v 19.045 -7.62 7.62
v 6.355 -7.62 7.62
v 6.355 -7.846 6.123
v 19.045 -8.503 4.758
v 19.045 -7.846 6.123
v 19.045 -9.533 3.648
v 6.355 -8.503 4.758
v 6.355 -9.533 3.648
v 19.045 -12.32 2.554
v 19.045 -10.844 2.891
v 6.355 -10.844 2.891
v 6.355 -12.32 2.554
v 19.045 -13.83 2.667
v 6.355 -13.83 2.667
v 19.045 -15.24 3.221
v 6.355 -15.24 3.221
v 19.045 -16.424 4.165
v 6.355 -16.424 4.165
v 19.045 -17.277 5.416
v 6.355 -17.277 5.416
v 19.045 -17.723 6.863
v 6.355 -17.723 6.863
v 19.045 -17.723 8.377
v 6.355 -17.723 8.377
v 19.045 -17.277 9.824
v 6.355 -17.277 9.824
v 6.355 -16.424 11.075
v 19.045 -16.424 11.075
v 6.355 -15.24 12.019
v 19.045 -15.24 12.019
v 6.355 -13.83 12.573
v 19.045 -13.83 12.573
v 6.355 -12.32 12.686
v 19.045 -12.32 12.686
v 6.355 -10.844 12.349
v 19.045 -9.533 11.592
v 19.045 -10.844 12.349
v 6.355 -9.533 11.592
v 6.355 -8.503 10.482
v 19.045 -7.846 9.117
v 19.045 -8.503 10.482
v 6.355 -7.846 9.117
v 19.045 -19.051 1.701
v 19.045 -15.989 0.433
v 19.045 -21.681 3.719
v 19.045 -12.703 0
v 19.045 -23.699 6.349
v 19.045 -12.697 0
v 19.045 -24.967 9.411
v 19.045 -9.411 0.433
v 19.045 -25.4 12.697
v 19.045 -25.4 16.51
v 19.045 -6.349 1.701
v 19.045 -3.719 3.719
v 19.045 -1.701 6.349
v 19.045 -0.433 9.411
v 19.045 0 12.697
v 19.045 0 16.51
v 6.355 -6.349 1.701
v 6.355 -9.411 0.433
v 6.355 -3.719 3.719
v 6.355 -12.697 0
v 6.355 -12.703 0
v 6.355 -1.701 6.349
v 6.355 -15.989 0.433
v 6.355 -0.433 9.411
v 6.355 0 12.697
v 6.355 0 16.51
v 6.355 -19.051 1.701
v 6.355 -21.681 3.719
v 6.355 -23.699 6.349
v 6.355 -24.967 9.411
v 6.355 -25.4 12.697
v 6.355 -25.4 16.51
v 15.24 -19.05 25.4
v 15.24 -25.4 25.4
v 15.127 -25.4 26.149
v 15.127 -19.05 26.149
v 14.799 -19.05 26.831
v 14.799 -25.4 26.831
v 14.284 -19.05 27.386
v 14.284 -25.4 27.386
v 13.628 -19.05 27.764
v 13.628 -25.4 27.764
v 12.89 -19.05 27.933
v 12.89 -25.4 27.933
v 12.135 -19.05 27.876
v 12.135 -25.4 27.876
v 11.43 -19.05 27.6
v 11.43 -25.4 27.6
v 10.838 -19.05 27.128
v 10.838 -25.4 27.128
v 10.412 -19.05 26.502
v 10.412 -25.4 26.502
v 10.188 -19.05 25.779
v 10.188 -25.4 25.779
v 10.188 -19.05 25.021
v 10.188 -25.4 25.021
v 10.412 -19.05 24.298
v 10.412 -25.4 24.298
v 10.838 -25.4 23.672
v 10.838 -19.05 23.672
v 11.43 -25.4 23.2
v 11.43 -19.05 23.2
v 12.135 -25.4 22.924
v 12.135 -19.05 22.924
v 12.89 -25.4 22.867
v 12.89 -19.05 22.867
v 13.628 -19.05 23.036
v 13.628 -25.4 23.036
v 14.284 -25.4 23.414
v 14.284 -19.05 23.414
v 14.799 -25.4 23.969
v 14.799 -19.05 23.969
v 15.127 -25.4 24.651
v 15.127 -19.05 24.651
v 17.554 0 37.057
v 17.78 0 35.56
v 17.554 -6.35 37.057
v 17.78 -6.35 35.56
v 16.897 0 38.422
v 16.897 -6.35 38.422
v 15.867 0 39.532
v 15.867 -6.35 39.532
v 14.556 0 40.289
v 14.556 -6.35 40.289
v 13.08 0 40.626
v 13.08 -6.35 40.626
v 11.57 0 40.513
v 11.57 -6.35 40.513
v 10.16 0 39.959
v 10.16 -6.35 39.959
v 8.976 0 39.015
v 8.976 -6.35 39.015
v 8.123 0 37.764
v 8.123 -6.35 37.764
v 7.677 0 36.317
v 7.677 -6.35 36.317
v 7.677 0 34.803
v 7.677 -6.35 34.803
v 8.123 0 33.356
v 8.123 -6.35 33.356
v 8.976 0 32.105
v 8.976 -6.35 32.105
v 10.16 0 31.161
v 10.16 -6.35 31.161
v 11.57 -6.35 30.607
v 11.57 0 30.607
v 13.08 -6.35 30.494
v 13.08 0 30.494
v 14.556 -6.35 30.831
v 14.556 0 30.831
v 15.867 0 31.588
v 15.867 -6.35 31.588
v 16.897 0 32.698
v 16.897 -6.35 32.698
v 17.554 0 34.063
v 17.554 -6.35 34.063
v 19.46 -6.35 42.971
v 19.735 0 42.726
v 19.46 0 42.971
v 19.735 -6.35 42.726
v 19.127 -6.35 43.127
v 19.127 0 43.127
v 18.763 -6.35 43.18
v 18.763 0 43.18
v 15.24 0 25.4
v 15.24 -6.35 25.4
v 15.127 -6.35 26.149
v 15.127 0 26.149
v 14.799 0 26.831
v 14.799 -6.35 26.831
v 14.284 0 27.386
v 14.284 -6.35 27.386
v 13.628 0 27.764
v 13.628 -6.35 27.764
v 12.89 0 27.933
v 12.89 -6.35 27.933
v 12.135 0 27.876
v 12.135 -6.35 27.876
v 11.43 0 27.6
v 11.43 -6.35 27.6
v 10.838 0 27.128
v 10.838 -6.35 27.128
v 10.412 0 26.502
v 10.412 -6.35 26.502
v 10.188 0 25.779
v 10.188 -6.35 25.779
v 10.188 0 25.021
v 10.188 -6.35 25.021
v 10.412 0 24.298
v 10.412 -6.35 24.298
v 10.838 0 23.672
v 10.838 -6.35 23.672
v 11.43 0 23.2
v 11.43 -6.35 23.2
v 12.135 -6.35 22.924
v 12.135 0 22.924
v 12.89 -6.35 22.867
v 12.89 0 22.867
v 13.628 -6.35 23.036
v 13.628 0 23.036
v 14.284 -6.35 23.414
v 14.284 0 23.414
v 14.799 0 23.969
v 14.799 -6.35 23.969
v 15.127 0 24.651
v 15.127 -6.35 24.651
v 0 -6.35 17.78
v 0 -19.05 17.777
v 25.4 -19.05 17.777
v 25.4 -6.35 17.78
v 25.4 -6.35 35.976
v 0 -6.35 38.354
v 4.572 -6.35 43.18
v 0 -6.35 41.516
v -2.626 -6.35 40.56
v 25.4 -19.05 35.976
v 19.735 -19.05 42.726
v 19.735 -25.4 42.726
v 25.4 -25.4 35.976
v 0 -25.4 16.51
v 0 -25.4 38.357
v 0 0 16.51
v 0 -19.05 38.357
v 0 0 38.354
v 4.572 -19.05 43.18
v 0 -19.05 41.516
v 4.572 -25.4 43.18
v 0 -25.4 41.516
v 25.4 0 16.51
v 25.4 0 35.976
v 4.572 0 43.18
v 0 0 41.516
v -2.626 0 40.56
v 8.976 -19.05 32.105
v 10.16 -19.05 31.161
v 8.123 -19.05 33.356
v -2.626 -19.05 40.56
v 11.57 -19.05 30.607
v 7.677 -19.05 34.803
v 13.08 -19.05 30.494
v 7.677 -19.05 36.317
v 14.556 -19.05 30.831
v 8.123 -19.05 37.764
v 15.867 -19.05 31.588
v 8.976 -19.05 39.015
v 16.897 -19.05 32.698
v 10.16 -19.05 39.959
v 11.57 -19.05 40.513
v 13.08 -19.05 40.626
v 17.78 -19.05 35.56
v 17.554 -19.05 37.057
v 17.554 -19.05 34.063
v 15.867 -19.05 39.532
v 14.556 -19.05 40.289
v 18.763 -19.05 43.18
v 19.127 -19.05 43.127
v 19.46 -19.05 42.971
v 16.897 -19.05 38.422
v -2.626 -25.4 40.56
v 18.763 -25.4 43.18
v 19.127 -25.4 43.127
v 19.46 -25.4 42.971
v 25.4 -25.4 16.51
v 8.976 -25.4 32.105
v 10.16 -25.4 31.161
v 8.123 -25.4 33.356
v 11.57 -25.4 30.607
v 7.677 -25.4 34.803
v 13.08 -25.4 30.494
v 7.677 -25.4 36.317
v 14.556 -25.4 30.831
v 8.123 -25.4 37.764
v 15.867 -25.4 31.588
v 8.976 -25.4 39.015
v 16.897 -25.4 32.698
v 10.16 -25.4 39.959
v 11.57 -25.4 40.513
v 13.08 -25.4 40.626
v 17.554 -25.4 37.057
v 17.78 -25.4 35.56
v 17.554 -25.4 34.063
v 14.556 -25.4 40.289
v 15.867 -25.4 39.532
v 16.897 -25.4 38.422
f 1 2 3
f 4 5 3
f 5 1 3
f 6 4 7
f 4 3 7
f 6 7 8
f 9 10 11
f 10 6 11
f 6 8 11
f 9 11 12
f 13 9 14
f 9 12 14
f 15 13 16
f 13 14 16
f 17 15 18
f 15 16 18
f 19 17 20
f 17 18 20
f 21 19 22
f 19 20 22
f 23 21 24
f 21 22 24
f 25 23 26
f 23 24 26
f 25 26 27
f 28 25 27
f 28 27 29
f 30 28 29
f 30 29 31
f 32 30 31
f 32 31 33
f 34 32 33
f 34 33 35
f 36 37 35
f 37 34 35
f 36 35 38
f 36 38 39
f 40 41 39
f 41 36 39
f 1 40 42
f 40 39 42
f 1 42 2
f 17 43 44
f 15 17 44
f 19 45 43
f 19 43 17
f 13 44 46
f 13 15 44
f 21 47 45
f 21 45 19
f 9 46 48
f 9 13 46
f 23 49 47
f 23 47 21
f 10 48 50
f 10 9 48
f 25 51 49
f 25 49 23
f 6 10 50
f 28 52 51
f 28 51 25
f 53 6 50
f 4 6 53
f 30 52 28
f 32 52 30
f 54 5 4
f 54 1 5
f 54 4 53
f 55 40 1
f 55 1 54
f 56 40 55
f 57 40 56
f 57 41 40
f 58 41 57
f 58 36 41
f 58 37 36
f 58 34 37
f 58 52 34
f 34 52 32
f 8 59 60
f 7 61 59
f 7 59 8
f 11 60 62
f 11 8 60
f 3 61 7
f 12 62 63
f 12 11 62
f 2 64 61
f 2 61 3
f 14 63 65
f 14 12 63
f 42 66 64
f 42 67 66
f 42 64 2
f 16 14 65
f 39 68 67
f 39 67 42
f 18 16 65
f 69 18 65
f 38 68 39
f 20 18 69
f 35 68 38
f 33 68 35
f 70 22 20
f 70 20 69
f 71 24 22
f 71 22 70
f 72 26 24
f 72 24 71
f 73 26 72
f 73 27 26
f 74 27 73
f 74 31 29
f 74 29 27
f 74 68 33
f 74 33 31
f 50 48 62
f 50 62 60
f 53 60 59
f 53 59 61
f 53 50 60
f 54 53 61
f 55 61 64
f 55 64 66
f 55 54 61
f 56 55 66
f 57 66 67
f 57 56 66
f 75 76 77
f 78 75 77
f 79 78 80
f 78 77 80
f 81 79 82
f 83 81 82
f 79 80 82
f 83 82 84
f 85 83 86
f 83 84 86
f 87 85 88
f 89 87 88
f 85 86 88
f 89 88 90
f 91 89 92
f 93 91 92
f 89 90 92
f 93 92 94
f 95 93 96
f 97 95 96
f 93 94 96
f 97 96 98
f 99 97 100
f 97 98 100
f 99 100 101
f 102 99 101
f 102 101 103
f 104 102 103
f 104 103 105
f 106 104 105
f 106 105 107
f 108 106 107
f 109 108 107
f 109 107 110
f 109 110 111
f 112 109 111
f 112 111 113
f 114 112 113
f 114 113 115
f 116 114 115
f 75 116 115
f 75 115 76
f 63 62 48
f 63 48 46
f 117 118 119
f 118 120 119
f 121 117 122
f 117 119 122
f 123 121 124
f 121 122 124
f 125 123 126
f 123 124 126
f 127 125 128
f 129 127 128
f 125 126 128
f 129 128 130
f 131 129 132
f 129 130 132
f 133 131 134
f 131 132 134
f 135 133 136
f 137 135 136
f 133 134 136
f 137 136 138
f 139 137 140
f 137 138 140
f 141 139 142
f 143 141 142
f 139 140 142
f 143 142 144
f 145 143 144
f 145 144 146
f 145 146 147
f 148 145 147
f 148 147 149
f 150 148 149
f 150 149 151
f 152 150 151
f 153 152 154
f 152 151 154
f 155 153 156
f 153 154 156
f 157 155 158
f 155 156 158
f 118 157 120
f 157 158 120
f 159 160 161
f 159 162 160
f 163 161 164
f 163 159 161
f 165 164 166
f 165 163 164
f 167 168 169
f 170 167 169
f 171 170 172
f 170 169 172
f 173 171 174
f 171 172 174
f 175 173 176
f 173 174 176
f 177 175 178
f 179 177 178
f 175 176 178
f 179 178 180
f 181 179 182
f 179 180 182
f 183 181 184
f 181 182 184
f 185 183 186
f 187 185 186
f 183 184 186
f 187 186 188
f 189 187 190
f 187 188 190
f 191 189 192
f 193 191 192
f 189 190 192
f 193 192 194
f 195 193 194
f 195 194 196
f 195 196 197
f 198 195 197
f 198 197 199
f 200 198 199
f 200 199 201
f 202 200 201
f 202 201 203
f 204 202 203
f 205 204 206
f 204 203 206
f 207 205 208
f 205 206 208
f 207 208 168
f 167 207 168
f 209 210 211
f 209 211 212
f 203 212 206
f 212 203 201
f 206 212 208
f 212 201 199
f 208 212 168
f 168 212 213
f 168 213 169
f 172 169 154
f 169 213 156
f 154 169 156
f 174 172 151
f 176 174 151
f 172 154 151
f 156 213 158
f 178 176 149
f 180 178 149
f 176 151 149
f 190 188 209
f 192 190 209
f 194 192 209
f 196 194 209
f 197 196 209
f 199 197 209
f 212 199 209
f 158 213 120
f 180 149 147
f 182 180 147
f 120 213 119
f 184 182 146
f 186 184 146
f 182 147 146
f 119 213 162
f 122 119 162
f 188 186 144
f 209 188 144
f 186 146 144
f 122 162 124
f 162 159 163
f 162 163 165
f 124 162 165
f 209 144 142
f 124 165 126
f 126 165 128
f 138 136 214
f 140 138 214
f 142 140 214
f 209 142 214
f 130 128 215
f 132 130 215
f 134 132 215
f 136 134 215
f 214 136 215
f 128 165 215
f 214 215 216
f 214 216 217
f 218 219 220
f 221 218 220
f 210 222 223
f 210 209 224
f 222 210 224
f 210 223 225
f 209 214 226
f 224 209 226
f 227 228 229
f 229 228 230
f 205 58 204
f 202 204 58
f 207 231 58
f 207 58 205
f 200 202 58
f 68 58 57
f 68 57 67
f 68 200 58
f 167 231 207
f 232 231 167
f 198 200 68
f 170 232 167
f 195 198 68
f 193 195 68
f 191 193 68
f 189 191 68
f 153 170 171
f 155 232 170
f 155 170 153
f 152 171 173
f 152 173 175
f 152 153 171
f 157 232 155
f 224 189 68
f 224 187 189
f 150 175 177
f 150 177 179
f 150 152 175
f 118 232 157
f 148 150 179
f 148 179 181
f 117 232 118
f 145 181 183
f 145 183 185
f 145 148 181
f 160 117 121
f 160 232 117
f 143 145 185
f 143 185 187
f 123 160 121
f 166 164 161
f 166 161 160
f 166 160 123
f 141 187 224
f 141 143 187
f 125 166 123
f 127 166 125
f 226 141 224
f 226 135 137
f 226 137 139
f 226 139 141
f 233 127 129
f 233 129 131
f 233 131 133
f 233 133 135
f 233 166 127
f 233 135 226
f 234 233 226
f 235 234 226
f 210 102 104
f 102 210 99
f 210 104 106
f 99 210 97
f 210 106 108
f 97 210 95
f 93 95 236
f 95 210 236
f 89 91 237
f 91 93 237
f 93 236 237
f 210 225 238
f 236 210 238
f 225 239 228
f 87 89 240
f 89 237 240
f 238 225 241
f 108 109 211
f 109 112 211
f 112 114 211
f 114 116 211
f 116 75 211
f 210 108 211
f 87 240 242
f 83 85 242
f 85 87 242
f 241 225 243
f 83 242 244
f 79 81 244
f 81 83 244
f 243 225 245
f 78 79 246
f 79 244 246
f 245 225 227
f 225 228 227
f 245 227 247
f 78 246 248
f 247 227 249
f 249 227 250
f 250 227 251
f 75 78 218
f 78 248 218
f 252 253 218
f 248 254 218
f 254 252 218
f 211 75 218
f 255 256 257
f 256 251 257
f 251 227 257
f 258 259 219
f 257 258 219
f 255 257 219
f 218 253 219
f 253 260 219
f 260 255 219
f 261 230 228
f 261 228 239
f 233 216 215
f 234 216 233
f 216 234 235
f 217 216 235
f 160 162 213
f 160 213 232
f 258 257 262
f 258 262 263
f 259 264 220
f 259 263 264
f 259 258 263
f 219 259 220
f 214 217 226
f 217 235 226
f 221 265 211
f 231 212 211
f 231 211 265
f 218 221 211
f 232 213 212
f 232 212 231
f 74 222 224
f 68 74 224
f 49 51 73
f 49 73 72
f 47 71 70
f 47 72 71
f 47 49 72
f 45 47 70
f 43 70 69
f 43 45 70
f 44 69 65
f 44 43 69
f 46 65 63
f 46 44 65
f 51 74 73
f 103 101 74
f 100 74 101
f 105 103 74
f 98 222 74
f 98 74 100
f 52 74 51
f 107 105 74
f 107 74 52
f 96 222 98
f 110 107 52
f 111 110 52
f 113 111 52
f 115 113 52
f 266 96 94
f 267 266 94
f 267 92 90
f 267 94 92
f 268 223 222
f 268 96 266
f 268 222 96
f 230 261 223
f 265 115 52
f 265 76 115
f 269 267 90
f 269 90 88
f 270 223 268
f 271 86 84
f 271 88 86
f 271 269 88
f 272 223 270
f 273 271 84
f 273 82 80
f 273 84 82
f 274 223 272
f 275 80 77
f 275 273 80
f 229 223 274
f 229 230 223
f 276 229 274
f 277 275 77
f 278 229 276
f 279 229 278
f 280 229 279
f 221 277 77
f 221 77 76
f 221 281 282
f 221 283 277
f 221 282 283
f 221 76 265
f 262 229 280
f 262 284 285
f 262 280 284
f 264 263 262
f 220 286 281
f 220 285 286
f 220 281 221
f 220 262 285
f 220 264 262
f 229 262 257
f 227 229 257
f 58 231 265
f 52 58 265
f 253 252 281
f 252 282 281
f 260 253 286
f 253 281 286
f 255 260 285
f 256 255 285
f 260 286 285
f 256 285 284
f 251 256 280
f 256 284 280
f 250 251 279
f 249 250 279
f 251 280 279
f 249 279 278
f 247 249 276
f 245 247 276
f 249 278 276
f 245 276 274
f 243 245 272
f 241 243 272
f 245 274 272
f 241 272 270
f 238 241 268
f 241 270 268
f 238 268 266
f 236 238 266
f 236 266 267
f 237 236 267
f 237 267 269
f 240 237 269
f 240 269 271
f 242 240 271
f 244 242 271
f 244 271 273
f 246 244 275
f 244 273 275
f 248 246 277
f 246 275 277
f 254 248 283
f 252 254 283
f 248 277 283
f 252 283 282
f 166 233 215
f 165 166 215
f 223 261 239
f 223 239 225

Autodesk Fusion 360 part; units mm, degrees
sketch "Sketch1" plane through (0, 0, 0) normal (1, 0, 0) x (0, 1, 0)
  line L0 (0, 0) -> (-25.4, 0)
  line L1 (-25.4, 0) -> (-25.4, 43.18)
  line L2 (-25.4, 43.18) -> (-19.05, 43.18)
  line L3 (0, 0) -> (0, 43.18)
  line L4 (0, 43.18) -> (-6.35, 43.18)
  line L5 (-6.35, 43.18) -> (-6.35, 17.78)
  line L6 (-19.05, 43.18) -> (-19.05, 17.7768)
  line L7 (-19.05, 17.7768) -> (-6.35, 17.78)
  circle A0 centre (-12.7, 7.62) radius 5.08
  dimension "d1" = 25.4
  dimension "d2" = 43.18
  dimension "d3" = 6.35
  dimension "d5" = 25.4
  dimension "d6" = 10.16
  dimension "d7" = 12.7
  dimension "d8" = 7.62
  dimension "d10" = 6.35
  dimension "d11" = 12.7
  dimension "d12" = 43.18
extrude "Extrude1" add sketch "Sketch1" along normal blind 25.4
sketch "Sketch2" plane through (25.4, 0, 0) normal (1, 0, 0) x (0, 1, 0)
  circle A0 centre (-12.7, 7.62) radius 5.08
  line L0 (0, 0) -> (0, 43.18)
  line L1 (0, 43.18) -> (-6.35, 43.18)
  line L2 (-6.35, 43.18) -> (-6.35, 17.78)
  line L3 (-6.35, 17.78) -> (-19.05, 17.7768)
  line L4 (-19.05, 17.7768) -> (-19.05, 43.18)
  line L5 (-19.05, 43.18) -> (-25.4, 43.18)
  line L6 (-25.4, 43.18) -> (-25.4, 0)
  line L7 (-25.4, 0) -> (0, 0)
  line L8 (-25.4, 0) -> (0, 0)
  line L9 (0, 0) -> (0, 16.51)
  line L10 (0, 16.51) -> (-25.4, 16.51)
  line L11 (-25.4, 16.51) -> (-25.4, 0)
  dimension "d28" = 16.51
extrude "Extrude2" cut sketch "Sketch2" against normal blind 6.3551 contours L0 L6 L7 L8 L9 L10 L11
sketch "Sketch3" plane through (0, 0, 0) normal (-1, 0, 0) x (0, -1, 0)
  circle A0 centre (12.7, 7.62) radius 5.08
  line L0 (0, 43.18) -> (0, 0)
  line L1 (0, 0) -> (25.4, 0)
  line L2 (25.4, 0) -> (25.4, 43.18)
  line L3 (25.4, 43.18) -> (19.05, 43.18)
  line L4 (19.05, 43.18) -> (19.05, 17.7768)
  line L5 (19.05, 17.7768) -> (6.35, 17.78)
  line L6 (6.35, 17.78) -> (6.35, 43.18)
  line L7 (6.35, 43.18) -> (0, 43.18)
  line L8 (0, 0) -> (25.4, 0)
  line L9 (25.4, 0) -> (25.4, 16.51)
  line L10 (25.4, 16.51) -> (0, 16.51)
  line L11 (0, 16.51) -> (0, 0)
  dimension "d29" = 16.51
extrude "Extrude3" cut sketch "Sketch3" against normal blind 6.3551 contours L0 L1 L2 L8 L9 L10 L11
sketch "Sketch4" plane through (0, -25.4, 0) normal (0, -1, 0) x (1, 0, 0)
  line L0 (6.3551, 16.51) -> (6.3551, 0)
  line L1 (6.3551, 0) -> (19.0449, 0)
  line L2 (19.0449, 0) -> (19.0449, 16.51)
  line L3 (19.0449, 16.51) -> (25.4, 16.51)
  line L4 (25.4, 16.51) -> (25.4, 43.18)
  line L5 (25.4, 43.18) -> (0, 43.18)
  line L6 (0, 43.18) -> (0, 16.51)
  line L7 (0, 16.51) -> (6.3551, 16.51)
  line L8 (0, 43.18) -> (25.4422, 43.18)
  line L9 (25.4422, 43.18) -> (25.4422, 17.78)
  line L10 (25.4422, 17.78) -> (0, 17.78)
  line L11 (0, 17.78) -> (0, 43.18)
  circle A0 centre (12.7, 25.4) radius 2.54
  circle A1 centre (12.7, 35.56) radius 5.08
  dimension "d19" = 25.4
  dimension "d20" = 5.08
  dimension "d22" = 12.7
  dimension "d23" = 10.16
  dimension "d24" = 7.62
  dimension "d25" = 12.7
  dimension "d47" = 10.16
extrude "Extrude4" cut sketch "Sketch4" against normal blind 40.64 contours A0 | A1
fillet "Fillet1" radius 12.7 2 edges at (12.7, -25.4, 0) (12.7, 0, 0)
chamfer "Chamfer1" distance 6.0452 angle 50 2 edges at (25.4, -22.225, 43.18) (25.4, -3.175, 43.18) measured on face at (8.4667, -23.2833, 43.18) measured on face at (8.4667, -2.1167, 43.18)
chamfer "Chamfer2" distance 4.572 angle 20 1 edges at (0, -3.175, 43.18) measured on face at (12.9032, -2.1167, 43.18)
chamfer "Chamfer3" distance 4.572 angle 20 1 edges at (0, -22.225, 43.18) measured on face at (12.9032, -23.2833, 43.18)
sketch "Sketch5" plane through (0, -25.4, 0) normal (0, -1, 0) x (1, 0, 0)
  line L0 (4.572, 43.18) -> (0, 41.5159)
  line L1 (0, 41.5159) -> (0, 16.51)
  line L2 (0, 16.51) -> (6.3551, 16.51)
  line L3 (6.3551, 16.51) -> (6.3551, 12.7)
  line L4 (6.3551, 12.7) -> (19.0449, 12.7)
  line L5 (19.0449, 12.7) -> (19.0449, 16.51)
  line L6 (19.0449, 16.51) -> (25.4, 16.51)
  line L7 (25.4, 16.51) -> (25.4, 35.9756)
  line L8 (25.4, 35.9756) -> (19.3548, 43.18)
  line L9 (19.3548, 43.18) -> (4.572, 43.18)
  circle A0 centre (12.7, 35.56) radius 5.08
  circle A1 centre (12.7, 25.4) radius 2.54
  line L10 (0, 41.5159) -> (-2.6255, 40.5603)
  line L11 (-2.6255, 40.5603) -> (0, 38.3573)
  dimension "d38" = 2.794
  dimension "d39" = 60
extrude "Extrude5" add sketch "Sketch5" against normal blind 6.35 contours L1 L10 L11
sketch "Sketch6" plane through (0, 0, 0) normal (0, 1, 0) x (-1, 0, 0)
  line L0 (0, 41.5159) -> (-4.572, 43.18)
  line L1 (-4.572, 43.18) -> (-19.3548, 43.18)
  line L2 (-19.3548, 43.18) -> (-25.4, 35.9756)
  line L3 (-25.4, 35.9756) -> (-25.4, 16.51)
  line L4 (-25.4, 16.51) -> (-19.0449, 16.51)
  line L5 (-19.0449, 16.51) -> (-19.0449, 12.7)
  line L6 (-19.0449, 12.7) -> (-6.3551, 12.7)
  line L7 (-6.3551, 12.7) -> (-6.3551, 16.51)
  line L8 (-6.3551, 16.51) -> (0, 16.51)
  line L9 (0, 16.51) -> (0, 41.5159)
  circle A0 centre (-12.7, 25.4) radius 2.54
  circle A1 centre (-12.7, 35.56) radius 5.08
  line L10 (0, 41.5159) -> (2.6255, 40.5603)
  line L11 (2.6255, 40.5603) -> (0, 38.354)
  line L12 (0, 38.354) -> (0, 41.5159)
  dimension "d42" = 2.794
extrude "Extrude6" add sketch "Sketch6" against normal blind 6.35 contours L9 L10 L11 L12
fillet "Fillet2" radius 1.27 2 edges at (19.3548, -22.225, 43.18) (19.3548, -3.175, 43.18)
